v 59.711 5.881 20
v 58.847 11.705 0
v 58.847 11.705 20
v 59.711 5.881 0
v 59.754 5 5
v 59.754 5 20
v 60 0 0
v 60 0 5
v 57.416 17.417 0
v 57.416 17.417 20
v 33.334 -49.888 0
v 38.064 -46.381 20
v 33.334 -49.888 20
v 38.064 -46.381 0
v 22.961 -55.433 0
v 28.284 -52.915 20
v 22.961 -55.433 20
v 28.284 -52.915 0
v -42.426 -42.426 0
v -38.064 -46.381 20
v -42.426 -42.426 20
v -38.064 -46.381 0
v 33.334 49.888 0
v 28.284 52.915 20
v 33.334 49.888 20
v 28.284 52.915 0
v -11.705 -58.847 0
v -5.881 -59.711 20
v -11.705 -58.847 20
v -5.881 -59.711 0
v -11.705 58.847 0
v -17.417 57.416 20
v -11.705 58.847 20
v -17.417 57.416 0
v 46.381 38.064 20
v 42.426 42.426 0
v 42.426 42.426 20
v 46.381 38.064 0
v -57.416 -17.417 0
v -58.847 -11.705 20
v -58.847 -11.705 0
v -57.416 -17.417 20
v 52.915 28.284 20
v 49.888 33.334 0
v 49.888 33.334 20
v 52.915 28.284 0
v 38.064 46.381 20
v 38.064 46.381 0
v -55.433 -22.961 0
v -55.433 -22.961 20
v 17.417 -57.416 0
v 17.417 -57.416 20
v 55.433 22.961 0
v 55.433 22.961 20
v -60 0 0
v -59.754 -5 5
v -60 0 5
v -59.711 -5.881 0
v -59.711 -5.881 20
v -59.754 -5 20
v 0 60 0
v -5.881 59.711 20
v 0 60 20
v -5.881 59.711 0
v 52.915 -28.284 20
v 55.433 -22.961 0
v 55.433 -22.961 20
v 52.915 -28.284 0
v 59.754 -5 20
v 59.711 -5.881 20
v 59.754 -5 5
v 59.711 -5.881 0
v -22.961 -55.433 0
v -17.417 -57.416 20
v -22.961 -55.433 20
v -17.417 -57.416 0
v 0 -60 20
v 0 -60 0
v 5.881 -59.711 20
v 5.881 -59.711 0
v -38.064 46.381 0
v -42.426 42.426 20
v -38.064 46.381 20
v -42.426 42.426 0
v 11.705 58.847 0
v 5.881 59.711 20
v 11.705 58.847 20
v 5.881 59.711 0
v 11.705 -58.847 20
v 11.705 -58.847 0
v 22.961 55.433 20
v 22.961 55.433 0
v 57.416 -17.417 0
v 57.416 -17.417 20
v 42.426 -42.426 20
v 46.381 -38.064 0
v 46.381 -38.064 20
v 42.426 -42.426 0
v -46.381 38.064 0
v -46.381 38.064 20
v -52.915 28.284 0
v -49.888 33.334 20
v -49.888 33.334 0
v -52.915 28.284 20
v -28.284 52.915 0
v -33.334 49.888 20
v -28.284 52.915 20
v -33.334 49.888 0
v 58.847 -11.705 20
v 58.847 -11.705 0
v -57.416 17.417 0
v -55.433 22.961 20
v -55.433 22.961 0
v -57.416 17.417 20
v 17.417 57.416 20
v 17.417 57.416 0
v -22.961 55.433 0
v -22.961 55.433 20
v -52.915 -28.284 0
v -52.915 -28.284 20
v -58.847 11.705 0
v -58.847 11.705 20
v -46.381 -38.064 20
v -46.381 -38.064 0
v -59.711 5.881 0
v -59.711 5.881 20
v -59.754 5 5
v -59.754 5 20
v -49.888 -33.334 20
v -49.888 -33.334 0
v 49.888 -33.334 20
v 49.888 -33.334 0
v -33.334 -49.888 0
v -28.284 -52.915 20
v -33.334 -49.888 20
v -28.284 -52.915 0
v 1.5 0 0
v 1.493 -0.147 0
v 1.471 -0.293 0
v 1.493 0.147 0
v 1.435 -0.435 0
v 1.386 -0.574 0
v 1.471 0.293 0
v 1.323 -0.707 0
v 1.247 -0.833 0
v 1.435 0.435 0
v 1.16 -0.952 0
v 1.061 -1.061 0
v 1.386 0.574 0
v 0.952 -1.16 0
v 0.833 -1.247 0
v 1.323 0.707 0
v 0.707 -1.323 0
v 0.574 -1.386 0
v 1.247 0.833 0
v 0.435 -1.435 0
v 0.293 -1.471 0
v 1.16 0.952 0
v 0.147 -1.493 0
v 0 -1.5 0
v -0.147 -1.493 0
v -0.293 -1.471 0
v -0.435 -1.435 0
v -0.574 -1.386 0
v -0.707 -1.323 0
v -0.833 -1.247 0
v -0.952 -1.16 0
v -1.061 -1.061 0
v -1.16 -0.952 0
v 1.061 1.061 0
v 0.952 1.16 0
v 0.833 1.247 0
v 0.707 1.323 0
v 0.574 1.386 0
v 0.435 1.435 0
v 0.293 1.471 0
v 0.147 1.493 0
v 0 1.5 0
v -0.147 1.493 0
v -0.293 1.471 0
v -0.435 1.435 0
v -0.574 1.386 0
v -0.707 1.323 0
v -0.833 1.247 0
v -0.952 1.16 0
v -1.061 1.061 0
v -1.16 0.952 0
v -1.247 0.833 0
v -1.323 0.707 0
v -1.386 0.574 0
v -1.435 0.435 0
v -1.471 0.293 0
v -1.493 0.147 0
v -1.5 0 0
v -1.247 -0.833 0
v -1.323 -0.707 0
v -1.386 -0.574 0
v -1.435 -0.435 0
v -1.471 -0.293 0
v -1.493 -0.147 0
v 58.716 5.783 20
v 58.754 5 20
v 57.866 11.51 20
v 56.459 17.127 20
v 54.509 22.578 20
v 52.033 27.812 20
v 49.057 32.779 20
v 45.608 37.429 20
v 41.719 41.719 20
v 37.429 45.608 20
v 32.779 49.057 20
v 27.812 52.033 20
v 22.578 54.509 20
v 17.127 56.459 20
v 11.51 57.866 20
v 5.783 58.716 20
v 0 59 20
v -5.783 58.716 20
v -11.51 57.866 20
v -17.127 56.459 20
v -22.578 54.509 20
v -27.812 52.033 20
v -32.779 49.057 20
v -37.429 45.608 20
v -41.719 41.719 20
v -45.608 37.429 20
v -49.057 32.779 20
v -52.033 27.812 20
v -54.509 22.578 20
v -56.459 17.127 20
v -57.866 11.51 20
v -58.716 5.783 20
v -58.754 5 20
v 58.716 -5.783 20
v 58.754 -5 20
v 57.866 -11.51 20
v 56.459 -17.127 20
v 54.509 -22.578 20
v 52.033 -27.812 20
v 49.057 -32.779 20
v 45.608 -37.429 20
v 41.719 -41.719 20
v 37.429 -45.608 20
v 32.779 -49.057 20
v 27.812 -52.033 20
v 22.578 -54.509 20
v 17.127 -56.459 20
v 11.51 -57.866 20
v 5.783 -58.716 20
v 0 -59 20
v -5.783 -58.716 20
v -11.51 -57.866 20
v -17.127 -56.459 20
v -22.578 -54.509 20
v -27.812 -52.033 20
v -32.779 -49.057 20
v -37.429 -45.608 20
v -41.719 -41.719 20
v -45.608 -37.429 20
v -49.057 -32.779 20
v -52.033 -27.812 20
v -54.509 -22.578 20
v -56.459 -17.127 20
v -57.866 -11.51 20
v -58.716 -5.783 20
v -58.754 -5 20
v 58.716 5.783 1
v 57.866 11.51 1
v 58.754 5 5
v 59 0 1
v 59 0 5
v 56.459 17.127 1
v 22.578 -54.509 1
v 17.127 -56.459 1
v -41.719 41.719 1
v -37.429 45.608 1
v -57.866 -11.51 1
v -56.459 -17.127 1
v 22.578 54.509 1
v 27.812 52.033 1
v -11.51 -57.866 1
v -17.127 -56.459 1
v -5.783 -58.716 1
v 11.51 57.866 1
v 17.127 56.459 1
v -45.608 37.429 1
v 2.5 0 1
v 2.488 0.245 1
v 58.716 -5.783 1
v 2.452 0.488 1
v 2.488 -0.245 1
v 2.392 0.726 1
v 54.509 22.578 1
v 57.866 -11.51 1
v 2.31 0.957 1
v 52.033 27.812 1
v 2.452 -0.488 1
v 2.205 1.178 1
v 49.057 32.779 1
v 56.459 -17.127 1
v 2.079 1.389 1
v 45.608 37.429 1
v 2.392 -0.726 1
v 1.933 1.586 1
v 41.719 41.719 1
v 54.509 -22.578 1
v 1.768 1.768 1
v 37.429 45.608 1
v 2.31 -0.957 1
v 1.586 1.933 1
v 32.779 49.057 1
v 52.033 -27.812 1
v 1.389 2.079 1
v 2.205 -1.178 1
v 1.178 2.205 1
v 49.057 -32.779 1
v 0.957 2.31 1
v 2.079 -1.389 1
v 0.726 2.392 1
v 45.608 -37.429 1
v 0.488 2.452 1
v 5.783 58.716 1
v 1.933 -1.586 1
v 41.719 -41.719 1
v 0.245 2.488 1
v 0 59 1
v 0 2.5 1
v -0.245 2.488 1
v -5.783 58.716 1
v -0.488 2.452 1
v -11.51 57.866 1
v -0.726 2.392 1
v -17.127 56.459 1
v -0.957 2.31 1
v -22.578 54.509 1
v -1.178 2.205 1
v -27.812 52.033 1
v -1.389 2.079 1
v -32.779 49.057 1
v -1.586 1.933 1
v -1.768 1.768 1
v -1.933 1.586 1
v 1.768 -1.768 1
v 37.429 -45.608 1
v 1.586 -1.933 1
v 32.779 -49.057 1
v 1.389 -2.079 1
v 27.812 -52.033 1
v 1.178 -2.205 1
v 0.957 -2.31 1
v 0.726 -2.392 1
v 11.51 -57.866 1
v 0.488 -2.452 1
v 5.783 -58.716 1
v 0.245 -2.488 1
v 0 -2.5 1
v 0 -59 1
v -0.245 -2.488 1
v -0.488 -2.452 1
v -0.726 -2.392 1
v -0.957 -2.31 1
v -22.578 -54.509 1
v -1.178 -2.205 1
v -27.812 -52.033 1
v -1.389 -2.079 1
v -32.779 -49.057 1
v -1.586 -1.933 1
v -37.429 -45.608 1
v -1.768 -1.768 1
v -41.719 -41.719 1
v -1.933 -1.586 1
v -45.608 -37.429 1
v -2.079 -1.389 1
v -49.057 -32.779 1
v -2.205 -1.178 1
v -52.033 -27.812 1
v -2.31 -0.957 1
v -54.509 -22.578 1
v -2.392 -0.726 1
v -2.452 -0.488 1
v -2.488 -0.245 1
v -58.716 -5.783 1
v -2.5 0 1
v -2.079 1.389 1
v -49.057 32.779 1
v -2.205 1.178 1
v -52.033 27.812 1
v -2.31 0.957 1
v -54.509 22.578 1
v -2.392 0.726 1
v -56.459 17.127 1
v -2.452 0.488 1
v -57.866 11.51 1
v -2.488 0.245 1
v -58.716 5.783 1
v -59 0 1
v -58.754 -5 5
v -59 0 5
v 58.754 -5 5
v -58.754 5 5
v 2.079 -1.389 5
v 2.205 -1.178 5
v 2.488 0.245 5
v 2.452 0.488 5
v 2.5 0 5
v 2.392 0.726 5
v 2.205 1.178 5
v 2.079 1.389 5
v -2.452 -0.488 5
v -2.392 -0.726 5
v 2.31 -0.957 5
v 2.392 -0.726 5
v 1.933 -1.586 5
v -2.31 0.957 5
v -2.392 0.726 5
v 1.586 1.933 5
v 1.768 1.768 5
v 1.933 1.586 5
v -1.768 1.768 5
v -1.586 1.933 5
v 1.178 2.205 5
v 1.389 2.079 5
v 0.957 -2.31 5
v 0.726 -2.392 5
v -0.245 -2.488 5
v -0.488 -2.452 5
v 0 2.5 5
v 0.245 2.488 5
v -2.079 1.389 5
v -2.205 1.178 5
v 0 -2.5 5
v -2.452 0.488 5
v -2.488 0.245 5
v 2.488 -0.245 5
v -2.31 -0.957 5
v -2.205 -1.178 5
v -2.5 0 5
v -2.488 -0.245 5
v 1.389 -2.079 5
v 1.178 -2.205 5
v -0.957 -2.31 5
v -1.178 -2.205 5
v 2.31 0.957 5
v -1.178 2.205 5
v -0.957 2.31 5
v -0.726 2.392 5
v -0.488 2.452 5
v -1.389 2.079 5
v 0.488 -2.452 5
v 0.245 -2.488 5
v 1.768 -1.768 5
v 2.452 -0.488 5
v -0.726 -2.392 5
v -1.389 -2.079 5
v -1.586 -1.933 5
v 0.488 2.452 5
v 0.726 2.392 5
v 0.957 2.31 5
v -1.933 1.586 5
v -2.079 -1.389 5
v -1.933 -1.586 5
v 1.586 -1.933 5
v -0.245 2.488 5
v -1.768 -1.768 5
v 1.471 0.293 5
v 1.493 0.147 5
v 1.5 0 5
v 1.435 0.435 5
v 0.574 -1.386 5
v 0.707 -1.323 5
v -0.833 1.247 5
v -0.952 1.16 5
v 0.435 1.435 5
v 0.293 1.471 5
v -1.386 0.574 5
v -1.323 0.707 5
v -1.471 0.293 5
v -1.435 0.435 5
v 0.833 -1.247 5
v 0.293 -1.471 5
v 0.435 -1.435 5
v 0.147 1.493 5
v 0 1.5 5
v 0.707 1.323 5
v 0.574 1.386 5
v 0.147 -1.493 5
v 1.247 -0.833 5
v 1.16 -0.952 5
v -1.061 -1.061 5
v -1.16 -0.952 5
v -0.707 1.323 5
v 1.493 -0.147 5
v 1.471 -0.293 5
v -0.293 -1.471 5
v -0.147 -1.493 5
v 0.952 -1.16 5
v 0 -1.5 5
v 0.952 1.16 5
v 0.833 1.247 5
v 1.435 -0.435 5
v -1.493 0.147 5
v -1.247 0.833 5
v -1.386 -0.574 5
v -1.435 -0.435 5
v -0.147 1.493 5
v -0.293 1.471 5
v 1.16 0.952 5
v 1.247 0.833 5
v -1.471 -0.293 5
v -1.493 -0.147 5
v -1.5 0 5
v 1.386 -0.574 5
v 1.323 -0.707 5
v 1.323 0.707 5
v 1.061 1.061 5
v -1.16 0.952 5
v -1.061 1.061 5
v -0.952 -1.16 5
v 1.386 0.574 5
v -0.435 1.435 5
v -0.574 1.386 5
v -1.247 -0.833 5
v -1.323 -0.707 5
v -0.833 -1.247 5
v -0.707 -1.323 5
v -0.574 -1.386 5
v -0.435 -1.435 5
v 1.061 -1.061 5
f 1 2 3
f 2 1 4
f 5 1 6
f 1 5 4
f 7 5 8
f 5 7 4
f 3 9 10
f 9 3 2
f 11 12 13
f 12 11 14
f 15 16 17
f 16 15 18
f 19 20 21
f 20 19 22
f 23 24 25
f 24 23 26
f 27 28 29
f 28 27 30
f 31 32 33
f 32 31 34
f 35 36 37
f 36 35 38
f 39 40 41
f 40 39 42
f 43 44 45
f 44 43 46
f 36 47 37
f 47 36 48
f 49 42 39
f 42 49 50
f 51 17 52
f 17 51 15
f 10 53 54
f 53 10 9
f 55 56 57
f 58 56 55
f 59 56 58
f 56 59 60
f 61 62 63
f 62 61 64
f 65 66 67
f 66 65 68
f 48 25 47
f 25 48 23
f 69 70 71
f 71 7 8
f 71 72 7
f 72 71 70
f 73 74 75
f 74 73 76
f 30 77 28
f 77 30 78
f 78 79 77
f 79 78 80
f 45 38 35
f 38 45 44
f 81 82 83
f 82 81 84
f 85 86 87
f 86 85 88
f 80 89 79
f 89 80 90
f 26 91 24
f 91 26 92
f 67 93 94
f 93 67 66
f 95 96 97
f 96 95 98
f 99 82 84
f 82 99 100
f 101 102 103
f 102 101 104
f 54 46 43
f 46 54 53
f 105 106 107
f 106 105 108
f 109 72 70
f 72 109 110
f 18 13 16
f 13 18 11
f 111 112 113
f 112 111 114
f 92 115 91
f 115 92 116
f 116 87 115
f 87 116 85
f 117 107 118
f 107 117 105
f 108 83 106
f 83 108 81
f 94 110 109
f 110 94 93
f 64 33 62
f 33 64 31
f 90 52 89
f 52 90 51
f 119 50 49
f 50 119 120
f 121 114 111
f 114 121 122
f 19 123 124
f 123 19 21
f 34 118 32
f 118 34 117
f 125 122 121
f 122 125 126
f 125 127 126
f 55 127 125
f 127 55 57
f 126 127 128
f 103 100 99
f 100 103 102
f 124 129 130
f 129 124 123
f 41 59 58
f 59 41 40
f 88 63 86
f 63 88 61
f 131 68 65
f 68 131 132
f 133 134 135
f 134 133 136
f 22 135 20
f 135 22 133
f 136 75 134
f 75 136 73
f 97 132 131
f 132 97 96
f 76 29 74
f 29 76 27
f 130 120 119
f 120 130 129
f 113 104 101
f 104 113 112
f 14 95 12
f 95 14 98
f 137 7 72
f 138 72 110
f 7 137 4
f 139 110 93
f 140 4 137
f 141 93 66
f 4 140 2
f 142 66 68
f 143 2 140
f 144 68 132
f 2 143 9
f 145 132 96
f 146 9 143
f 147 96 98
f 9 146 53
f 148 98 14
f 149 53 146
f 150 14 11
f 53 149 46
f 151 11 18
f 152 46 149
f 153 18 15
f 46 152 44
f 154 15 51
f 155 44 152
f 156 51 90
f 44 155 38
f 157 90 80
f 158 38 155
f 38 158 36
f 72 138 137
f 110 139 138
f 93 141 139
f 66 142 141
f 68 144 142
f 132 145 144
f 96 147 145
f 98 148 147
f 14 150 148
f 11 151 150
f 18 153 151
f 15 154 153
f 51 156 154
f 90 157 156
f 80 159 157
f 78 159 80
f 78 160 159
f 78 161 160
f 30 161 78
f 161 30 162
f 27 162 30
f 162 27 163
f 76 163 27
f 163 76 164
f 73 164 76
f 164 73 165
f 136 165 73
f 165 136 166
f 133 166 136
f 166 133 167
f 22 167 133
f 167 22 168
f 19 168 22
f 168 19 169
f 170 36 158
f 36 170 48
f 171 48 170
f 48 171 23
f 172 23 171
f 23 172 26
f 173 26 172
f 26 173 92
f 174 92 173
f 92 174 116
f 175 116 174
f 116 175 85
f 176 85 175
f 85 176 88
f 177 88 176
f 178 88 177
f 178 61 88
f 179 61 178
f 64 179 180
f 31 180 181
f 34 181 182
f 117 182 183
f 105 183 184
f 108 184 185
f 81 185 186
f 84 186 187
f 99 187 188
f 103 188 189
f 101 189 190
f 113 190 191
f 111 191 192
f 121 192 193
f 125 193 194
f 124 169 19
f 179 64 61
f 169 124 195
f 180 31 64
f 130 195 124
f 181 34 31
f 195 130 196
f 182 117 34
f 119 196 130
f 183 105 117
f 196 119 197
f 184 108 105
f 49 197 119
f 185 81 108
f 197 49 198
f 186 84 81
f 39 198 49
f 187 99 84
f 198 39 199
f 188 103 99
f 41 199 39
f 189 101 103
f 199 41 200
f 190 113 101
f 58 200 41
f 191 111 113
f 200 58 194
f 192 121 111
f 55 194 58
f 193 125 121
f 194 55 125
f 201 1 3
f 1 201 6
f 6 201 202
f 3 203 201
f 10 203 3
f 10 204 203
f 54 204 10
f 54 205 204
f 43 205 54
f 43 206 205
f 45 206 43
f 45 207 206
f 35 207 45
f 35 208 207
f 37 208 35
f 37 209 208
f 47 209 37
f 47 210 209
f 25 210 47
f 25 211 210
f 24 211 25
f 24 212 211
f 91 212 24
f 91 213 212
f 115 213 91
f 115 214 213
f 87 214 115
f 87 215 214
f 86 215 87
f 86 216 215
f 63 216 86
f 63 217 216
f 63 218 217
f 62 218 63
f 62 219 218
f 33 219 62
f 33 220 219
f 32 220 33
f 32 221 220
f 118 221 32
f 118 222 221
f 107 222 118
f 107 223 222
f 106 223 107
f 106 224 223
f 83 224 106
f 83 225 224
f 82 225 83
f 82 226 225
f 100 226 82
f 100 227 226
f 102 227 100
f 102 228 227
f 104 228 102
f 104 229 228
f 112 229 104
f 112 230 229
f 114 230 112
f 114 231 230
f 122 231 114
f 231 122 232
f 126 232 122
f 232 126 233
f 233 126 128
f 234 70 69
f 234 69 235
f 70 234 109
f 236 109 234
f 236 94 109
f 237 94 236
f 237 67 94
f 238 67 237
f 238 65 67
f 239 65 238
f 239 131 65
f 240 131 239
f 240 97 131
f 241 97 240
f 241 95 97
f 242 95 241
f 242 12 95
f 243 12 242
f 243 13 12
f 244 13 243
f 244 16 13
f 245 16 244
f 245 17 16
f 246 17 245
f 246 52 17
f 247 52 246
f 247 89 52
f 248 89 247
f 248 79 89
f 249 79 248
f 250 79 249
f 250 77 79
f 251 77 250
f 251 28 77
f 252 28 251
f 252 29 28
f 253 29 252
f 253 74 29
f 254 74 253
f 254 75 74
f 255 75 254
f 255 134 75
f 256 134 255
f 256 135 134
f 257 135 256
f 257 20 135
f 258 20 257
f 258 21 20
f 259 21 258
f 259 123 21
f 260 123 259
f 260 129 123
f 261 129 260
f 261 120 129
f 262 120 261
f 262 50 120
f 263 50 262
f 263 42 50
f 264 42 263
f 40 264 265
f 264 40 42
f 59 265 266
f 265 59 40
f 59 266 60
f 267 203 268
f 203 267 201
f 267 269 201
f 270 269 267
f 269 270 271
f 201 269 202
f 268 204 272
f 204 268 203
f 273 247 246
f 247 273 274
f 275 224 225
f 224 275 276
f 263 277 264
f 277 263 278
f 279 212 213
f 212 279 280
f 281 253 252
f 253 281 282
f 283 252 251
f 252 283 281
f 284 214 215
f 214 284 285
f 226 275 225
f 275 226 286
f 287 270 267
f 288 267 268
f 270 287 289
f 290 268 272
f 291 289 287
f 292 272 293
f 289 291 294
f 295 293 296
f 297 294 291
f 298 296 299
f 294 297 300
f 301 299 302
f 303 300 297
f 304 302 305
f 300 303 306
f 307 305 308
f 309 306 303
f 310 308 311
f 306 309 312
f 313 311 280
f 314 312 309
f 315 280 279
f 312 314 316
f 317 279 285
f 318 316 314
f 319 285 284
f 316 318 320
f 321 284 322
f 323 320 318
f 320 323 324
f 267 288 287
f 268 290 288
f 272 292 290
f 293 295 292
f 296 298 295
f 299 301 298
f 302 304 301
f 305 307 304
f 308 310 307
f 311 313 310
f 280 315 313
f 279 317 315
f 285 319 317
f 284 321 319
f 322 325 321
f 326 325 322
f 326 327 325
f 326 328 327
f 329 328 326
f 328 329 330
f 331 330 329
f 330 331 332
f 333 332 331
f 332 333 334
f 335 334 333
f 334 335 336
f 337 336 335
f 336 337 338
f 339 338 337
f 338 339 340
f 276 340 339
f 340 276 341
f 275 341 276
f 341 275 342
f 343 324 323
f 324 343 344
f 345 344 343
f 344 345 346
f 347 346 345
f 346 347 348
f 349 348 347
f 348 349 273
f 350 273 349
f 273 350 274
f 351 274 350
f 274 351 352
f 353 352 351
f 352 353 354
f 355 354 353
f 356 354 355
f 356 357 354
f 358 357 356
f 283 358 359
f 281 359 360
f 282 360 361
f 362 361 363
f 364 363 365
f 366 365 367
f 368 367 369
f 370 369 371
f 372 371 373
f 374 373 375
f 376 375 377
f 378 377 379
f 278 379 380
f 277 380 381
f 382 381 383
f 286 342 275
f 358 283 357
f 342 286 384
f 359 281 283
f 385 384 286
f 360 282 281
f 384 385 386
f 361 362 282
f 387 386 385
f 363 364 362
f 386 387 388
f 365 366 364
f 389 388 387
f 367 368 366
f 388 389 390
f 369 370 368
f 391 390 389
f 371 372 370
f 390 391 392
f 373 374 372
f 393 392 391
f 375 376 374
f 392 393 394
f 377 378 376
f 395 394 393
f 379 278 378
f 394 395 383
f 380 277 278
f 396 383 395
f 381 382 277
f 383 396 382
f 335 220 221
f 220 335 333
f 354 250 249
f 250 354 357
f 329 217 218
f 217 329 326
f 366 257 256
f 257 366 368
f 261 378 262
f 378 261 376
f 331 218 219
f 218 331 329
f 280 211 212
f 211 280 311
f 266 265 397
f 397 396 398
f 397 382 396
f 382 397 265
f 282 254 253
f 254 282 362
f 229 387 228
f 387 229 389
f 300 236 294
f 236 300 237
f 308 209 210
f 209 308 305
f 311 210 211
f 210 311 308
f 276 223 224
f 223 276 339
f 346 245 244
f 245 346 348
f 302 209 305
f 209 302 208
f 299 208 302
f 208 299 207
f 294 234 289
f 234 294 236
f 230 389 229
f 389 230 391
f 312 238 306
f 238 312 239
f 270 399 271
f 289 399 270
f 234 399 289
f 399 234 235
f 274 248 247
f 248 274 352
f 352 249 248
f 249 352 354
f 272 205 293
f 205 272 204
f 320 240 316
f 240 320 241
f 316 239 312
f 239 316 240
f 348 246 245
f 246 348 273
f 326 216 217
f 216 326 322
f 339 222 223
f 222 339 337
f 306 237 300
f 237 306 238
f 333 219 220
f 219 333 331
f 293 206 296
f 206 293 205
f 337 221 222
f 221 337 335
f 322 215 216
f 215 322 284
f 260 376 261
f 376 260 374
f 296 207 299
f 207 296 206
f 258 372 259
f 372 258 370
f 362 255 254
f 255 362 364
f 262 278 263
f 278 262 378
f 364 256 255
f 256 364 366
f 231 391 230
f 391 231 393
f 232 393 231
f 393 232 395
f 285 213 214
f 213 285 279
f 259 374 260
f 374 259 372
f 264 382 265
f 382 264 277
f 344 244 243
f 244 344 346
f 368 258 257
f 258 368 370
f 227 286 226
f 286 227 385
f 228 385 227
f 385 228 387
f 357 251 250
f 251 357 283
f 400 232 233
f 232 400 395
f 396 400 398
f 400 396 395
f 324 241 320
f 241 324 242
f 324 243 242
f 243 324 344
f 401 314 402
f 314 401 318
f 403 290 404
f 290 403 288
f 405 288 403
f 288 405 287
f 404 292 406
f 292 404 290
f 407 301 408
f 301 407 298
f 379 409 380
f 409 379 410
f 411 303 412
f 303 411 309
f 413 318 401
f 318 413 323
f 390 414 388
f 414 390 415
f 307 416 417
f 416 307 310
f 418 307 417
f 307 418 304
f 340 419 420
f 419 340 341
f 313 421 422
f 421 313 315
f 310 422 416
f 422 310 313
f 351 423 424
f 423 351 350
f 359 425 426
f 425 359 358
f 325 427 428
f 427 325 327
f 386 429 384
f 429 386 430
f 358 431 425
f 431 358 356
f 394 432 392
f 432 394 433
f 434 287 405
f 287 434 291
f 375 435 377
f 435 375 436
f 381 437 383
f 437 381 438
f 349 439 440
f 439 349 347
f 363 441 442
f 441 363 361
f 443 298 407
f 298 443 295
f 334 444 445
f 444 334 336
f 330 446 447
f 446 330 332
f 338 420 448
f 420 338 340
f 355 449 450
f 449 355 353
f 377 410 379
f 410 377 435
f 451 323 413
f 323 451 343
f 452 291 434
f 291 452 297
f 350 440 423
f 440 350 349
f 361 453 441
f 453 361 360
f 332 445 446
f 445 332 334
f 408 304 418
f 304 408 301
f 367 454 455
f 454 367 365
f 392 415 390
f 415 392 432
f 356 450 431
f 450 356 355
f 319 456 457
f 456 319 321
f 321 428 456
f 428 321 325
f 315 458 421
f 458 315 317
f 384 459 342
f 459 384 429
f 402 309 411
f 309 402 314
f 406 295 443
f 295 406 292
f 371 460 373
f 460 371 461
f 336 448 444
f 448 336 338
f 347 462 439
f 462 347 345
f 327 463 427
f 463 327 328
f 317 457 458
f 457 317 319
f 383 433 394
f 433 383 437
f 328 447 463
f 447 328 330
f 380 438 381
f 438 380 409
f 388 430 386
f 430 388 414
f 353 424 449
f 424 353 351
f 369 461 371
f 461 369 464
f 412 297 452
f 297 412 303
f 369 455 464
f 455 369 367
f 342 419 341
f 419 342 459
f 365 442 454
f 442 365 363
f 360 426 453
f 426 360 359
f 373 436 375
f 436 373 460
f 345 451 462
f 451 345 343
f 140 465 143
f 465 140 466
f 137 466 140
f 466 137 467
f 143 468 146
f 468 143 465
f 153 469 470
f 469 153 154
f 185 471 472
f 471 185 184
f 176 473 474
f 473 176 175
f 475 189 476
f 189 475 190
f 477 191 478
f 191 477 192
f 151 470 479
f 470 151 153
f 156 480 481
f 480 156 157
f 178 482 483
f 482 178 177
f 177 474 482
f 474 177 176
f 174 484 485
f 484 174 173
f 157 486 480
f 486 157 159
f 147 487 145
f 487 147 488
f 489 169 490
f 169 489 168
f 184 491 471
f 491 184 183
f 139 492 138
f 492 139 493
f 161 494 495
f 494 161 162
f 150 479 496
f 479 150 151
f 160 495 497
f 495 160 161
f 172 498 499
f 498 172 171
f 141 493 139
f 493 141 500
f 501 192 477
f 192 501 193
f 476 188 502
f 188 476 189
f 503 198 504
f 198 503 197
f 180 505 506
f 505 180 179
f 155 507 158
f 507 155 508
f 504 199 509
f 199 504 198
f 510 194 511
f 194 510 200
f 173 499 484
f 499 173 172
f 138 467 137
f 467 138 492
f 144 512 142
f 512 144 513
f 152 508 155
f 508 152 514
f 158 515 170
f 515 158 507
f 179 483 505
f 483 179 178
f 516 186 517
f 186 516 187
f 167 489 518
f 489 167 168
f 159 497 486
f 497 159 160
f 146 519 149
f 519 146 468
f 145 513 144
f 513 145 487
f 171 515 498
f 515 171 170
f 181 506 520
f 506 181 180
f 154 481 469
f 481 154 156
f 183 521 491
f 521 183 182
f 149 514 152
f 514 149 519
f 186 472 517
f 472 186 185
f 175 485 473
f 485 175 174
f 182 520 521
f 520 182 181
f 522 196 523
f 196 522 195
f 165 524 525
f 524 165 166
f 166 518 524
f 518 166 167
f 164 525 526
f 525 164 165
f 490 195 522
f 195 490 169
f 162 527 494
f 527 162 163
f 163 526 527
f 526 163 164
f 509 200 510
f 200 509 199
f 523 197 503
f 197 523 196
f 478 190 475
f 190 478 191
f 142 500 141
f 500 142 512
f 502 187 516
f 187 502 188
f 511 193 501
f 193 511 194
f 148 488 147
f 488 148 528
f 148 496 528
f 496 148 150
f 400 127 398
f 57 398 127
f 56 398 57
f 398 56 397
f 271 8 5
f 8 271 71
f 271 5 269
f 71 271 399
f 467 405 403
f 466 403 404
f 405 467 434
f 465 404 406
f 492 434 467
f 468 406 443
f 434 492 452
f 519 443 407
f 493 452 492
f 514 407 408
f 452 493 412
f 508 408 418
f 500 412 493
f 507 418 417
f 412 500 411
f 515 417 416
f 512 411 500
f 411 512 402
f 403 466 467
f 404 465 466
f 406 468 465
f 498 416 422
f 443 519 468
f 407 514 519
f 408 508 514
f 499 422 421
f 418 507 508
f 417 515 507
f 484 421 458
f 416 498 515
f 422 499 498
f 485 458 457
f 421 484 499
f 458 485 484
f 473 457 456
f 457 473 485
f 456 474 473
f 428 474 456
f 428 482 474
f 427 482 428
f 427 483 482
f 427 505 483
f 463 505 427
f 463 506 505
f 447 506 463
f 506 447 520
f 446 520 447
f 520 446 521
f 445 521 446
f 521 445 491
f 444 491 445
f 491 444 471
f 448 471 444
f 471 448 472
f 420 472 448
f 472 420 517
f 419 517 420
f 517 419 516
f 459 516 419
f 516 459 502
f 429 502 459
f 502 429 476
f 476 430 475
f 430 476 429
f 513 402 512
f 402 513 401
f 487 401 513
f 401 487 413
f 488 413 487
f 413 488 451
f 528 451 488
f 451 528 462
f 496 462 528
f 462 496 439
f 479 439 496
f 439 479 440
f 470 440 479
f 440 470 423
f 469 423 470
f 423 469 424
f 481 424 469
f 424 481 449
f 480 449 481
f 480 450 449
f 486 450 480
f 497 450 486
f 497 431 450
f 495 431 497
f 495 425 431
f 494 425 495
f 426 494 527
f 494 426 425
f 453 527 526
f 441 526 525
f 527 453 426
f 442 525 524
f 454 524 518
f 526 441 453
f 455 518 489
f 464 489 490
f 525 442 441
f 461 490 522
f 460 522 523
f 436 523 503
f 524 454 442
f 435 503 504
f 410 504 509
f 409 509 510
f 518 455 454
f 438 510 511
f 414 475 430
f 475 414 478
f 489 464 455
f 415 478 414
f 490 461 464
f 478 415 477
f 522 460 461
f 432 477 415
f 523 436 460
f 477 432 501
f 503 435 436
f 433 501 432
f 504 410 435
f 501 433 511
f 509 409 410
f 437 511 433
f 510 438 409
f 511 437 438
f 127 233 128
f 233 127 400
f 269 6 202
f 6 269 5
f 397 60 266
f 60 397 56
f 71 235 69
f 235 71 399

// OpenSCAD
polomer = 60;
stena = 1;
vyska = 20; //15

// kolik
prumer_dira = 3;
dira_oseknuti = 10;
prumer_kolik = 5;
vyska_kolik = 12;

//vyrez
vyrez_sirka = 10;

$fn= 64;

difference() {
    union () {
        difference() {
            cylinder(vyska, r = polomer);
            translate([0,0,stena])
                cylinder(vyska, r = polomer-stena);
        };
        cylinder(vyska_kolik, d = prumer_kolik);
    }
    union()
    {
        difference()
        {
            cylinder(vyska, d = prumer_dira);
            translate([-prumer_dira/2,dira_oseknuti-prumer_dira/2,0])
                cube([prumer_dira,prumer_dira,vyska_kolik]);
            
        }
        translate([0,0,(vyska+5)/2])
        cube([polomer*2,10,vyska-5], true);
    }
};
